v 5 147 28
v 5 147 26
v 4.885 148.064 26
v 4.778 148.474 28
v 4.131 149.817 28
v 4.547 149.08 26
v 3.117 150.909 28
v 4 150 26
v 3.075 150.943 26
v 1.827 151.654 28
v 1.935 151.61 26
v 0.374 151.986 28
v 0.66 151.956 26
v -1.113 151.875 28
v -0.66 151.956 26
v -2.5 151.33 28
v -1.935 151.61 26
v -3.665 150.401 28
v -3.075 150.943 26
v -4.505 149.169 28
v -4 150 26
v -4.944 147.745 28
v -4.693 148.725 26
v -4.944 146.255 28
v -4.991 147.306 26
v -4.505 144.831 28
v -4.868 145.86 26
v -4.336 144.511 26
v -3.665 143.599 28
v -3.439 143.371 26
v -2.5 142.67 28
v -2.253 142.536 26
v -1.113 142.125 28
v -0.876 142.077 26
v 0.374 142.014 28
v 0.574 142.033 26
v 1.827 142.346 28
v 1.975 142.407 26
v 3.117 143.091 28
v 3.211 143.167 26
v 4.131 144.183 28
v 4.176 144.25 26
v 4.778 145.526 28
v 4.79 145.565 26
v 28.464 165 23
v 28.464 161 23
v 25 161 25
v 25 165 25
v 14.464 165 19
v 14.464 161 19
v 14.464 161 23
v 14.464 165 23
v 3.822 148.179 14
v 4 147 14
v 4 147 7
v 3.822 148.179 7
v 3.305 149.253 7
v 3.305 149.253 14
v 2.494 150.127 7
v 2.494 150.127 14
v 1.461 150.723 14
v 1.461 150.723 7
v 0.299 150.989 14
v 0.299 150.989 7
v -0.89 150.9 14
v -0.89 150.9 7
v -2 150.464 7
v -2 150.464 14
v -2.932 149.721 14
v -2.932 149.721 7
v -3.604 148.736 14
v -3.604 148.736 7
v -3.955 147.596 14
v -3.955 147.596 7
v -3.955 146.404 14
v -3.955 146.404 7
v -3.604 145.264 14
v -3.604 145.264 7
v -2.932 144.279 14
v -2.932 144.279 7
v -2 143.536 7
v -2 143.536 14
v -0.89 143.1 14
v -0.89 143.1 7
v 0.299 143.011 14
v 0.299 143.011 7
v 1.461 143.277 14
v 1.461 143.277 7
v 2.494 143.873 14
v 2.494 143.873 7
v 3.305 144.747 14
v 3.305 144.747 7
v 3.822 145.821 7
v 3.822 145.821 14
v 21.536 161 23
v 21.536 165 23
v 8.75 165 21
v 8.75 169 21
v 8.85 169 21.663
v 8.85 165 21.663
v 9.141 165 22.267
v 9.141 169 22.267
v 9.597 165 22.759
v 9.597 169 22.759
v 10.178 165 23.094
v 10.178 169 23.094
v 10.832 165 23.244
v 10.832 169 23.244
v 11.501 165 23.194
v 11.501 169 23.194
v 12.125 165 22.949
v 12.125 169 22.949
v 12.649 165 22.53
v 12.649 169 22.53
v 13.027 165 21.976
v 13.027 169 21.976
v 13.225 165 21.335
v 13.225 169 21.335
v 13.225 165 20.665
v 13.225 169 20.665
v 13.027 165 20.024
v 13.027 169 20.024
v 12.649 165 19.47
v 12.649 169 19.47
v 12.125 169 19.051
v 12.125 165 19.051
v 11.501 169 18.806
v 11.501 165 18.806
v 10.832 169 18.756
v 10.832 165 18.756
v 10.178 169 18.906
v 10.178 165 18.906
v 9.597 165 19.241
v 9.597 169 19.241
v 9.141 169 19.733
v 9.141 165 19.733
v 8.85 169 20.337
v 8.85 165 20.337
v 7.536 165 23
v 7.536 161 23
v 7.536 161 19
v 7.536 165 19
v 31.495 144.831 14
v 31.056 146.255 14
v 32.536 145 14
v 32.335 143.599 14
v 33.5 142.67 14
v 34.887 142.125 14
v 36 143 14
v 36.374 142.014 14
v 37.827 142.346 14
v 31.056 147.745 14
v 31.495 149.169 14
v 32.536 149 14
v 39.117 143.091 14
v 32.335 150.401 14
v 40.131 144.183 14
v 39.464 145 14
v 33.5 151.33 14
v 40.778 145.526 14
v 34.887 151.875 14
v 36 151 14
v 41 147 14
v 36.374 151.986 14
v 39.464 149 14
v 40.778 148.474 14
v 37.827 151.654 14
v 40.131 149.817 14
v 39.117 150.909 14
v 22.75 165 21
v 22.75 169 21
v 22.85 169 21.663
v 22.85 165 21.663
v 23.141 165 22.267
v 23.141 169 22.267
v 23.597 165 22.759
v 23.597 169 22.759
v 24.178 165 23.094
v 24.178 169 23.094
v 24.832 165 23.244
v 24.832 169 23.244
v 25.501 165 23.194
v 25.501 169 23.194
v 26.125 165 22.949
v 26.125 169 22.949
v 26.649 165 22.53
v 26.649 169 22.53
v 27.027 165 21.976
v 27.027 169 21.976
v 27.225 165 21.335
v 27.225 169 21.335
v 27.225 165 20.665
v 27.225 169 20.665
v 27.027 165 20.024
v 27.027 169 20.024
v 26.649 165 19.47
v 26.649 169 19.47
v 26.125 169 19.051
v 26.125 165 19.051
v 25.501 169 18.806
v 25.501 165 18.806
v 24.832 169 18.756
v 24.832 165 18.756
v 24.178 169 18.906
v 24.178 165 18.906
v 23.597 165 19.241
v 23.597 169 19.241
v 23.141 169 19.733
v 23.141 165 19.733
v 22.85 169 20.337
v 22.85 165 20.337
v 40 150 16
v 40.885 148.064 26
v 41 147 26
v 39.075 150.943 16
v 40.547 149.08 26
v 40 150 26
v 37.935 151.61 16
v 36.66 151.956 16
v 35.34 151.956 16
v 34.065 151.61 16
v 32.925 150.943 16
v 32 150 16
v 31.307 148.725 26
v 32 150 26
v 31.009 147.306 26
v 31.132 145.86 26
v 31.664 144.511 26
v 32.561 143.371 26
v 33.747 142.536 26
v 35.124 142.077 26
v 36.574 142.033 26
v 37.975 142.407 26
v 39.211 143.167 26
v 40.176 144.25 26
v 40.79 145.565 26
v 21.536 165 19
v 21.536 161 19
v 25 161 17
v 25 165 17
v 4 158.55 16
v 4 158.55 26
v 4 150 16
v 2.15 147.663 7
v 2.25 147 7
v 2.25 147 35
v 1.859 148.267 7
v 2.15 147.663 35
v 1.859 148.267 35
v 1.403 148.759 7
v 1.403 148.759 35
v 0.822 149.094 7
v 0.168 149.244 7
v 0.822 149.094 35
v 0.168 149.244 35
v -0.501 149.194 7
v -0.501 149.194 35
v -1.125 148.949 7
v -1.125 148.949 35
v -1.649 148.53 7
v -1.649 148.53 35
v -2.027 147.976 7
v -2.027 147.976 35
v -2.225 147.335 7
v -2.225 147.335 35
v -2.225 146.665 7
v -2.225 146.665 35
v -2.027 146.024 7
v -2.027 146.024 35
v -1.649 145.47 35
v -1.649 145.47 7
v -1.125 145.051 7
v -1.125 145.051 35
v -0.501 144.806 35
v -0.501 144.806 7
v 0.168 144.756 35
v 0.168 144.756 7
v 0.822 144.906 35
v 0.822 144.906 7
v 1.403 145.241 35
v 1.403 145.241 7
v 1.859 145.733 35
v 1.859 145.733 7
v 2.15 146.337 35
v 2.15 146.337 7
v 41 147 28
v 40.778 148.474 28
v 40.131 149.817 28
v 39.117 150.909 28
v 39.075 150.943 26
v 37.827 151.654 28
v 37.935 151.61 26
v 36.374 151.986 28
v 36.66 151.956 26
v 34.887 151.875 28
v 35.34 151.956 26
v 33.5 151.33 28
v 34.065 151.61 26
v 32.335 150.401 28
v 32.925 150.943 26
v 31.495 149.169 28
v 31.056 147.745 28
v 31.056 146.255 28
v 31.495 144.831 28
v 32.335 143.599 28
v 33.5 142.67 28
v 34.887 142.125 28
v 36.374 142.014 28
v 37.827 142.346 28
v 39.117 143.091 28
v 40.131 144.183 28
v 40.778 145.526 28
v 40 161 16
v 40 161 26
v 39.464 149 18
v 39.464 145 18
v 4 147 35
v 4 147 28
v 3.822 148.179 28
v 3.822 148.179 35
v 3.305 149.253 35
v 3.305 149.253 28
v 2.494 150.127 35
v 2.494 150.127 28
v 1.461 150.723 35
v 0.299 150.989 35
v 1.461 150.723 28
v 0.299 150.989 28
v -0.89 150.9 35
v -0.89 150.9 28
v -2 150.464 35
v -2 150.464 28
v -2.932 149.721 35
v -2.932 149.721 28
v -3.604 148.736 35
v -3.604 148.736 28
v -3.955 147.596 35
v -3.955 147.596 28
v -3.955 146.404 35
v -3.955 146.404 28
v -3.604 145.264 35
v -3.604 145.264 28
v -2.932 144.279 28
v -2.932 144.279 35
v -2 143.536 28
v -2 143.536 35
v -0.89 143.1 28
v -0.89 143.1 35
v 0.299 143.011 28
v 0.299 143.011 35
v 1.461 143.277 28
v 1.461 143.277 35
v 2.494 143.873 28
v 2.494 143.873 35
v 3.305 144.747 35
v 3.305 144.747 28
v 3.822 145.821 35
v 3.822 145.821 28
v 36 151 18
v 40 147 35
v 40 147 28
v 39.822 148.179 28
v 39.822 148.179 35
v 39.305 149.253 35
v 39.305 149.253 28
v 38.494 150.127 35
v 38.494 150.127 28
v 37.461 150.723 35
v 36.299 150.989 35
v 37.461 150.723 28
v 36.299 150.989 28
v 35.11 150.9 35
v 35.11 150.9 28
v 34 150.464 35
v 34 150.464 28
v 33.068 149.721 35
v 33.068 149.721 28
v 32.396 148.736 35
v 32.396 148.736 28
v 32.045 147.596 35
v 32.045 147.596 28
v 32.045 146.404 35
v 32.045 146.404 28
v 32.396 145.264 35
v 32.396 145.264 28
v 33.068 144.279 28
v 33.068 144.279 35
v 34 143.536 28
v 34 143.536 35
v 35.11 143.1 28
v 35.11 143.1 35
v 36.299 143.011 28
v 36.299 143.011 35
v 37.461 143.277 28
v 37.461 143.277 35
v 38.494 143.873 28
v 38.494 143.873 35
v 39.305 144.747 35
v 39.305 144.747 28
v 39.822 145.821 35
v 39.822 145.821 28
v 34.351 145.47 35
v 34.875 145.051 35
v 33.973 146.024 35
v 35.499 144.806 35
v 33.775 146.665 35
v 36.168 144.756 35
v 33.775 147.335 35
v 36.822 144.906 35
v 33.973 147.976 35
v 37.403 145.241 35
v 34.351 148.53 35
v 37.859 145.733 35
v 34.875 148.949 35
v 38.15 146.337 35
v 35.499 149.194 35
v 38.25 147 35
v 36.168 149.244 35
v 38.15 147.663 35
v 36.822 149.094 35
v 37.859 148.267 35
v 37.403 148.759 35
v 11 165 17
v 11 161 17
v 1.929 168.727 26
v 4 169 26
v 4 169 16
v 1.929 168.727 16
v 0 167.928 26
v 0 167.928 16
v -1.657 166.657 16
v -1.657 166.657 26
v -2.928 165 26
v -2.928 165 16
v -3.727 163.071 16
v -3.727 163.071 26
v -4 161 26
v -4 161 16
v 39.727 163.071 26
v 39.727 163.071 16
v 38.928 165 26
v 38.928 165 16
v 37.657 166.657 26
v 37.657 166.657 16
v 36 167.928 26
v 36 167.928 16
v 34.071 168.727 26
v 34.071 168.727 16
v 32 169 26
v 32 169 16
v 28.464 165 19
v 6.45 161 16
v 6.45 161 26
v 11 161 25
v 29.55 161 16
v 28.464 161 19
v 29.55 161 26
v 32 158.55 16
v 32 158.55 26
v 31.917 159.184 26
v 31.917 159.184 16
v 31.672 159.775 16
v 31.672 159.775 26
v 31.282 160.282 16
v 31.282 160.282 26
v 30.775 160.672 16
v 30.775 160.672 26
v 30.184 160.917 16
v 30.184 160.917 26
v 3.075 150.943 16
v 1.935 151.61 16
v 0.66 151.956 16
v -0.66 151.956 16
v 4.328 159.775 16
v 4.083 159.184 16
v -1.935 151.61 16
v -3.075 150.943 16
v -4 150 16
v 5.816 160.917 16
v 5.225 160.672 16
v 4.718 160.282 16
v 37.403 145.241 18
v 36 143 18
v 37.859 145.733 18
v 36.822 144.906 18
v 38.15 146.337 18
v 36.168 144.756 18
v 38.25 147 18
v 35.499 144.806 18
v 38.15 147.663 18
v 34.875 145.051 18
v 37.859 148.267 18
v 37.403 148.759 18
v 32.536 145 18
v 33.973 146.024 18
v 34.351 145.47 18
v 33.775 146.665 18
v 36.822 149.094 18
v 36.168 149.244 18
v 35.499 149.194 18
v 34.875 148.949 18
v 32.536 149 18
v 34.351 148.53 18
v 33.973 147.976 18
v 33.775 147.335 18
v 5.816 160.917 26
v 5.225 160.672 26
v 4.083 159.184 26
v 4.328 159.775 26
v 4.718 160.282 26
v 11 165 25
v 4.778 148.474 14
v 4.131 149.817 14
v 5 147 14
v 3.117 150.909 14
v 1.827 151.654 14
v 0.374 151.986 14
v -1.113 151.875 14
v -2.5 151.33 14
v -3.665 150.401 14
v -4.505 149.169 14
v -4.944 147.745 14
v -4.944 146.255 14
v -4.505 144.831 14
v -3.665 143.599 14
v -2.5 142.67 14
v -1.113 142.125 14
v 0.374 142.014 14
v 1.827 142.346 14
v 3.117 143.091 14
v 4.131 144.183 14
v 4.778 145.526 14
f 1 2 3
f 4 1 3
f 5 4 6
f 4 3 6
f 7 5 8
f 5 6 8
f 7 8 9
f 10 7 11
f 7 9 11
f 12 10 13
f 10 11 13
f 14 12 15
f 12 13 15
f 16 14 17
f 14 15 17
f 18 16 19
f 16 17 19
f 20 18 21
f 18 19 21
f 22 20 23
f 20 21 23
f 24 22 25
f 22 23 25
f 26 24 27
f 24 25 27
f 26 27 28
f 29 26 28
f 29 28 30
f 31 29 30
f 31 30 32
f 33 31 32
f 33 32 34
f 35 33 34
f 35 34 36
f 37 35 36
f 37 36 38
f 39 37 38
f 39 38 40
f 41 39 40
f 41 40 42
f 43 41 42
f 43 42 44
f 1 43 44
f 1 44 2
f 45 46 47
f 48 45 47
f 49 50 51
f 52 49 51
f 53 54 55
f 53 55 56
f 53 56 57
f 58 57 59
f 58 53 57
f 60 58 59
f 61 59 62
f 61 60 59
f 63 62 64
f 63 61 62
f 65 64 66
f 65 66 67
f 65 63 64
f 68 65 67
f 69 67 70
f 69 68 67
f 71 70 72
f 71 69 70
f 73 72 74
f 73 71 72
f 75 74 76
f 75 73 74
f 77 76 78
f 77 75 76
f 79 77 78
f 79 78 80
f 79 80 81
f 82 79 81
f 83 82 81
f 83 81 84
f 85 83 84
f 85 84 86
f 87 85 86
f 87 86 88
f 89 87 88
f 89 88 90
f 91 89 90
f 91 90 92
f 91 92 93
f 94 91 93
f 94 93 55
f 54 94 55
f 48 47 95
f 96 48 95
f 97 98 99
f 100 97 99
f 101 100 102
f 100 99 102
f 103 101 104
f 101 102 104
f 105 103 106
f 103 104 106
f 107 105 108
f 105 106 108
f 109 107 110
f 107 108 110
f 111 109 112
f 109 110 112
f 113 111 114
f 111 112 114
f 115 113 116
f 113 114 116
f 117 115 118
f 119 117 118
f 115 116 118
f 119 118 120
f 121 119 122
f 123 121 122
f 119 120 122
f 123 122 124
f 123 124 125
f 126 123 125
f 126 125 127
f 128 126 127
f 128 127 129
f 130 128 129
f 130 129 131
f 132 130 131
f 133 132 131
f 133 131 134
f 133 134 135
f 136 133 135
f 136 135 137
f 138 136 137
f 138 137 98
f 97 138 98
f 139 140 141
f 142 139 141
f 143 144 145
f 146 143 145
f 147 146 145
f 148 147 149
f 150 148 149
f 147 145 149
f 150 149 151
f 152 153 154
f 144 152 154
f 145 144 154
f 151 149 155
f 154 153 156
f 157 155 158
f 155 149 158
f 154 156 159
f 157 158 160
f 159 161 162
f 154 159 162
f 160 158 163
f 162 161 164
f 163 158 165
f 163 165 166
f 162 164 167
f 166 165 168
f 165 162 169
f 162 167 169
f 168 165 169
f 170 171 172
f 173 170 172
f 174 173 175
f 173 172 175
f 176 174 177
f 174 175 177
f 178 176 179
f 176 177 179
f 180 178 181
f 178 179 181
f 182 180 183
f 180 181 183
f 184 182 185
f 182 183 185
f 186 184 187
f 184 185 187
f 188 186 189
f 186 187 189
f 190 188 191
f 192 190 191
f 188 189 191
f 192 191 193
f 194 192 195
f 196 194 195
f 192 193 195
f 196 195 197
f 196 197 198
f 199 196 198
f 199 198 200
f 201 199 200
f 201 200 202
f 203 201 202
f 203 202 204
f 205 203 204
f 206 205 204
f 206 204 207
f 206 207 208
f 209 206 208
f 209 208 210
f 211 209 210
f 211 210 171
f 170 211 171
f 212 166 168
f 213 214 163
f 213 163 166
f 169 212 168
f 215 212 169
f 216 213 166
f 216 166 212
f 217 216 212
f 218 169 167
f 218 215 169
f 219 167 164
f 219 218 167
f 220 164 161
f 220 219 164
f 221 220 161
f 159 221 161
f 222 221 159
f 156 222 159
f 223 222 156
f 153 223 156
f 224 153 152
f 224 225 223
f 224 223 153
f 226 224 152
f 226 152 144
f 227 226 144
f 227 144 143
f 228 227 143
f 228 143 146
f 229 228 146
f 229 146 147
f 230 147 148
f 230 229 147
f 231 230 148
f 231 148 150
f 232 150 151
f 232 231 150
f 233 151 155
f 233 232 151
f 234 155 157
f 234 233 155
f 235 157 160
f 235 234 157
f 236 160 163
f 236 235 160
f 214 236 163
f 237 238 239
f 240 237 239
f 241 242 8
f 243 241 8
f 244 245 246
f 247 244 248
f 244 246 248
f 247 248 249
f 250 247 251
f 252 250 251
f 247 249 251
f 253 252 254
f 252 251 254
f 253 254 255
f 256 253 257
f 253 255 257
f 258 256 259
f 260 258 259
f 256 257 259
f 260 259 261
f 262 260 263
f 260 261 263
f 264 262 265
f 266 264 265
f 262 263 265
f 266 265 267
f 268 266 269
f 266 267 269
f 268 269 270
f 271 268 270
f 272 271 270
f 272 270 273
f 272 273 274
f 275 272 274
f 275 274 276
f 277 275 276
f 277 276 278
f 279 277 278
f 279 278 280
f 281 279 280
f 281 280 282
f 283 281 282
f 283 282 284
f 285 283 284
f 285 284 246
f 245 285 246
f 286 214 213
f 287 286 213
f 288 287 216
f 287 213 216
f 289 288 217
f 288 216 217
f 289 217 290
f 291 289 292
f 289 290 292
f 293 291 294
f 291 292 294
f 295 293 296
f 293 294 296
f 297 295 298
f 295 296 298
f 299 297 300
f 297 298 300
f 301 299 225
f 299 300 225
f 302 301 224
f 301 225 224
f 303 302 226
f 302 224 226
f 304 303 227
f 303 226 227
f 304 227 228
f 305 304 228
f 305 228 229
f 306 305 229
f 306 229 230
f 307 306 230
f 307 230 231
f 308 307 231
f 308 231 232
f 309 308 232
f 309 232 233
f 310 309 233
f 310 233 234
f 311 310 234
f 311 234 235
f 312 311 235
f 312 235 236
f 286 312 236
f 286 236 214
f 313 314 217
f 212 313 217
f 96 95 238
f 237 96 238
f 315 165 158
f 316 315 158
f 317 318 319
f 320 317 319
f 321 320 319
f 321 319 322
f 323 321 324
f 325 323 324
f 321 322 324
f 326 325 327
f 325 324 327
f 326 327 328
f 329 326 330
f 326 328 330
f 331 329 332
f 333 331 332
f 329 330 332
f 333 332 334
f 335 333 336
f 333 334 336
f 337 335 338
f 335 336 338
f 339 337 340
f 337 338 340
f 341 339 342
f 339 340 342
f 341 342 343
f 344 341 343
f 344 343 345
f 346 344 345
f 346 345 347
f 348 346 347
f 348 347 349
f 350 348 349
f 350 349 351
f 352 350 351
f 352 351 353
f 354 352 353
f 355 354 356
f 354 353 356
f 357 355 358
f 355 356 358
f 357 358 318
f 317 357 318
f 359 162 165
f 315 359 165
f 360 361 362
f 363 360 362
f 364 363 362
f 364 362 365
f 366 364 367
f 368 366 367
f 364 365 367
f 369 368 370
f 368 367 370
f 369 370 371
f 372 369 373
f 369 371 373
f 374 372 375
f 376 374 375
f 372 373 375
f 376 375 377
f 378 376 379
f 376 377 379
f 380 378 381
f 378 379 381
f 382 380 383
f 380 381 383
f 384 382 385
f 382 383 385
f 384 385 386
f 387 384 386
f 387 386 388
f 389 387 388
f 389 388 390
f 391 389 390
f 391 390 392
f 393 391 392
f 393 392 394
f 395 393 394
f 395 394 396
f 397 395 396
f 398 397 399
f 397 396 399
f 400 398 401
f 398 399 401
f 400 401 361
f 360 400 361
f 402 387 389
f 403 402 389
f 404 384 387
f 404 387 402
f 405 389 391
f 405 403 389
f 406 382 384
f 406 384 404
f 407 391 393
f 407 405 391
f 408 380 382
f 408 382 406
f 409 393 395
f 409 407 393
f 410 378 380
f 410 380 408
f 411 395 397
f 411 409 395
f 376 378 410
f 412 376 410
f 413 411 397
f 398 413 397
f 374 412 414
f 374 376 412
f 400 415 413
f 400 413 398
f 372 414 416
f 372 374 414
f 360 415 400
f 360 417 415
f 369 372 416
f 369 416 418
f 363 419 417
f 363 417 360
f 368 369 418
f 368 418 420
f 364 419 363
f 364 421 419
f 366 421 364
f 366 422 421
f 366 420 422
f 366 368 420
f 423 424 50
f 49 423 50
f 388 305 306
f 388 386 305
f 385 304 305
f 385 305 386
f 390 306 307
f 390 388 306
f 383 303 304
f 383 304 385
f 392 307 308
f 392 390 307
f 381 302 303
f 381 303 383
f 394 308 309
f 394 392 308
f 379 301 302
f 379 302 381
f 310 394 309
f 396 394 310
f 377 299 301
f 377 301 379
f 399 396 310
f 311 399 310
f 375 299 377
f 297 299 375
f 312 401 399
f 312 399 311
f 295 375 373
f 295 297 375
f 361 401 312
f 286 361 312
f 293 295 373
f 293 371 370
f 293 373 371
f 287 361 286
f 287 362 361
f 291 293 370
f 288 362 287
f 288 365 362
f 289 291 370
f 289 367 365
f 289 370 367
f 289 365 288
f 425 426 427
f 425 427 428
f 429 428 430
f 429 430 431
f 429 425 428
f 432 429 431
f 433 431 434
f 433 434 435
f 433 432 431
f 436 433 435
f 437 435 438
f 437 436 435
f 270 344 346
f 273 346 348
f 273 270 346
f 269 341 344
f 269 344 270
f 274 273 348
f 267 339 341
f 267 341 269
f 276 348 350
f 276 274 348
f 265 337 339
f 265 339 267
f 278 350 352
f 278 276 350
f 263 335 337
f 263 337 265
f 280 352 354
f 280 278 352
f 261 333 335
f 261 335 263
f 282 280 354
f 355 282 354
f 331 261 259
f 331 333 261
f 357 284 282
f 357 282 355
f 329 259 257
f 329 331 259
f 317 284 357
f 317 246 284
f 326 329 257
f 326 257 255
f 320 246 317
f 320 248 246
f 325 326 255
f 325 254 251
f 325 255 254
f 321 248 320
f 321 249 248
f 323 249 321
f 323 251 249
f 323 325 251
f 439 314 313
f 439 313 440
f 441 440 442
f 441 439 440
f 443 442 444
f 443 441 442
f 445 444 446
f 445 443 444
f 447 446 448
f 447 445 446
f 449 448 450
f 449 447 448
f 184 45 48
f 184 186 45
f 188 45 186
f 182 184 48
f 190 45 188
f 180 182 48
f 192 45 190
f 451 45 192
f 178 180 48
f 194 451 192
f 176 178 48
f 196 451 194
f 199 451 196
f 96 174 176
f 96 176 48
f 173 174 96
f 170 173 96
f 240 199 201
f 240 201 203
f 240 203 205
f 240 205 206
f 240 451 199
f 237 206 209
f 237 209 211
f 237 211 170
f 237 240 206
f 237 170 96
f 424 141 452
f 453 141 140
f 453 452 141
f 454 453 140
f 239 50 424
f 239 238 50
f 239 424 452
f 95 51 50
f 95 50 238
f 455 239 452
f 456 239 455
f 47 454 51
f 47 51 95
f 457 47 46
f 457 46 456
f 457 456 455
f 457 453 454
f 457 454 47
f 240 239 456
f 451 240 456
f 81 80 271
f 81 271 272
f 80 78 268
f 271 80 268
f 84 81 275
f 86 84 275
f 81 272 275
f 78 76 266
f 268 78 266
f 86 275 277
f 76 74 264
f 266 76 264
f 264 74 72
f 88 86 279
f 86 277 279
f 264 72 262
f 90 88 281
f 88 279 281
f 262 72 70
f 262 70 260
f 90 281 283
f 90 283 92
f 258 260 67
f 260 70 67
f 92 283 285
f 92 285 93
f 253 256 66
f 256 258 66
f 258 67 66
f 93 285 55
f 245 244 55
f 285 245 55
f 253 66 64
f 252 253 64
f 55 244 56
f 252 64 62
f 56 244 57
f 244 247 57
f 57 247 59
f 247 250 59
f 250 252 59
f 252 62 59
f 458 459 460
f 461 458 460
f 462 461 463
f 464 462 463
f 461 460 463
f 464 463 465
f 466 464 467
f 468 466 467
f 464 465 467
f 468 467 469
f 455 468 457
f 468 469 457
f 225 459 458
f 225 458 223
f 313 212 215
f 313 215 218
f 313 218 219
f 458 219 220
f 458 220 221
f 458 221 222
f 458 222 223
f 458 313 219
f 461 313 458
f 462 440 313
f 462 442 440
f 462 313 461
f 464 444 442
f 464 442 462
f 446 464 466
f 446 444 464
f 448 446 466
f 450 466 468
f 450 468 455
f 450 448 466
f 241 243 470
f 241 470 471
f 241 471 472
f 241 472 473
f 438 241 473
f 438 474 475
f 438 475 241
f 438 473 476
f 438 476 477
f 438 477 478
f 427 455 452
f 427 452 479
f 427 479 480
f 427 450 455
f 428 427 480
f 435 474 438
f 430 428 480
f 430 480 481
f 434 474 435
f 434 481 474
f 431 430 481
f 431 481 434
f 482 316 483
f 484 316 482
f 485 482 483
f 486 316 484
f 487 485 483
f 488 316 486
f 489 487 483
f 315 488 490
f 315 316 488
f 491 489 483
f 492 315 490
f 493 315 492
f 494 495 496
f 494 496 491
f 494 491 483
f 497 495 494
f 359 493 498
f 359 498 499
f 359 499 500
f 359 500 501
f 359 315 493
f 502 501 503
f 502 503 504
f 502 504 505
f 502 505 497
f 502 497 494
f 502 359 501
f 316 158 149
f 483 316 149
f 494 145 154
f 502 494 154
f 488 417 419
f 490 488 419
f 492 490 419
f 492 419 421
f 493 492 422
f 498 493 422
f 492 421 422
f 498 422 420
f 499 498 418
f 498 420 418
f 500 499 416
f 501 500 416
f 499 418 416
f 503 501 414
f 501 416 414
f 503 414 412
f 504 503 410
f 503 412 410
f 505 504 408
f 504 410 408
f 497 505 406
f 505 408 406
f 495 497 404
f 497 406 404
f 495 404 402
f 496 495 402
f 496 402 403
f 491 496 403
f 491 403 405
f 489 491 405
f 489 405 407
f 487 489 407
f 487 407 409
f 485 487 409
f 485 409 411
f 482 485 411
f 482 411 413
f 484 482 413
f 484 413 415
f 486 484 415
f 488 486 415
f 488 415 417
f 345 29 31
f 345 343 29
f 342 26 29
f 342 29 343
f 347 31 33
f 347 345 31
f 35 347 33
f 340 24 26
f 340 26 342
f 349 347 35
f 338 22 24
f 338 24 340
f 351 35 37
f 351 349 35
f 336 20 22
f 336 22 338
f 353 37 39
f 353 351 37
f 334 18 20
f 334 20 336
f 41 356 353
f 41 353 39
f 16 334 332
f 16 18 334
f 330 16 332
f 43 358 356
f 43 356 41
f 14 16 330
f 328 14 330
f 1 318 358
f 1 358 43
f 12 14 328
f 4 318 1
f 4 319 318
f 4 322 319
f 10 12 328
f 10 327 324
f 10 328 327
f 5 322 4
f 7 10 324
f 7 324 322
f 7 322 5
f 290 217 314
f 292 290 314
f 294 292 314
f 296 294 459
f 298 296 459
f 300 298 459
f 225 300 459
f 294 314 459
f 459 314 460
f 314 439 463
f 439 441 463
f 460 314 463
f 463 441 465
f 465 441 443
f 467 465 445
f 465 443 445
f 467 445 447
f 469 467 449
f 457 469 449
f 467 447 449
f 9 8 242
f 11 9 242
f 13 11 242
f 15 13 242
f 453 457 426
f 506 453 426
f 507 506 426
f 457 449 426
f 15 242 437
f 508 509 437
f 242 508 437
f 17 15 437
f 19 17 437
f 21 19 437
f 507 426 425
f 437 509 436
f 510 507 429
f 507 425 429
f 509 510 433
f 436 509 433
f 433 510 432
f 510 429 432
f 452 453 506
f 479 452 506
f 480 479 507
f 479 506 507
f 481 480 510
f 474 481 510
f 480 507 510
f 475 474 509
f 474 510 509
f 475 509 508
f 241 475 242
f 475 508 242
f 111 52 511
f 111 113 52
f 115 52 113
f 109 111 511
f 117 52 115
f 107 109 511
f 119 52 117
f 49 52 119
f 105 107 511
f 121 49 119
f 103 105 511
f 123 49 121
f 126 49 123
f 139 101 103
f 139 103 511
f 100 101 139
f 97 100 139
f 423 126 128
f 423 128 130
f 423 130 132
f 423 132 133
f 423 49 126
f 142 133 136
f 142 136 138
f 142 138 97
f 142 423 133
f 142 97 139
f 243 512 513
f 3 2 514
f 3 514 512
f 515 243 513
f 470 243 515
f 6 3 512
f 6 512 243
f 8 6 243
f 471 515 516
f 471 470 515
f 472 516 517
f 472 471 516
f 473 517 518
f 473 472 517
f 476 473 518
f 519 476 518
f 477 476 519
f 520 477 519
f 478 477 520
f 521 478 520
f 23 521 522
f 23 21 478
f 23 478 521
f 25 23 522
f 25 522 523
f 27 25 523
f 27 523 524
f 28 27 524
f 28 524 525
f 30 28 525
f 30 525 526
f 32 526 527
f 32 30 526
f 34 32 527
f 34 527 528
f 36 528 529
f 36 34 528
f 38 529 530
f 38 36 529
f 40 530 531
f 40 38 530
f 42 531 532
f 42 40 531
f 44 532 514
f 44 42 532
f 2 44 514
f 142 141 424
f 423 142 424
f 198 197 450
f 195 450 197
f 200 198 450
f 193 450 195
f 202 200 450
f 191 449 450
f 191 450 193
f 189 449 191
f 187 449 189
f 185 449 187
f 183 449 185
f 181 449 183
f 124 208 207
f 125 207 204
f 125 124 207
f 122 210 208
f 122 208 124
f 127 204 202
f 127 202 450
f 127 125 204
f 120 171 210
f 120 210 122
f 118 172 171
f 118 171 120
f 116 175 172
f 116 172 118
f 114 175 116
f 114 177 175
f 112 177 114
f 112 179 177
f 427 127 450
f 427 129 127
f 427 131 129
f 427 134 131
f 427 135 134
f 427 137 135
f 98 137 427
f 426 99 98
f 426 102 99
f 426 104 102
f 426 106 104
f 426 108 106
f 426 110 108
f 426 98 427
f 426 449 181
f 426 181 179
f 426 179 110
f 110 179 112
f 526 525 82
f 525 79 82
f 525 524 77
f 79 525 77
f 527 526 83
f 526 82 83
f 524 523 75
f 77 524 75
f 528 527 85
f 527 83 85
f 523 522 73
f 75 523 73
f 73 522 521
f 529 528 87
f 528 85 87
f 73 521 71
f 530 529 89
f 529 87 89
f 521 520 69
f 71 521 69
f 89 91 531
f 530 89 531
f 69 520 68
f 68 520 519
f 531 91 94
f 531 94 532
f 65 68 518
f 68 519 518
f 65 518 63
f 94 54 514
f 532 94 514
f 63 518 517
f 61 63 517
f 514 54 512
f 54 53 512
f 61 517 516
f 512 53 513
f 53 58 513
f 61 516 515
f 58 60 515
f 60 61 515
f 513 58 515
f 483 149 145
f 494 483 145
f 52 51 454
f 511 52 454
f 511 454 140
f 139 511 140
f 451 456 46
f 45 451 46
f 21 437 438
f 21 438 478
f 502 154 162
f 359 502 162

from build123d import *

# Parameters (mm, degrees)
SKETCH024_W             = 24
SKETCH024_H             = 10
SKETCH024_R             = 2.25
PAD008_DEPTH            = 8
PAD009_DEPTH            = 10
POCKET_DEPTH            = 4
SKETCH027_R             = 5
PAD010_DEPTH            = 2
PAD010_DEPTH_BACK       = 12
SKETCH028_R             = 4
PAD011_DEPTH            = 7
PAD011_DEPTH_BACK       = 21
SKETCH029_R             = 4
PAD012_DEPTH            = 7
POCKET001_DEPTH         = 4
SKETCH031_R             = 2.25
HOLE001_DEPTH           = 50
BODY003_PLACEMENT_ANGLE = 180


with BuildPart() as part:
    # Sketch024 → Pad008 (new body)
    with BuildSketch(Plane.XZ):
        with Locations((0, 44)):
            Rectangle(SKETCH024_W, SKETCH024_H)
        with Locations((-7, 44)):
            Circle(SKETCH024_R, mode=Mode.SUBTRACT)
        with Locations((7, 44)):
            Circle(SKETCH024_R, mode=Mode.SUBTRACT)
    extrude(amount=-PAD008_DEPTH)

    # Sketch025 (on Face1 of Pad008) → Pad009 (join)
    with BuildSketch(Plane(origin=(0, 0, 49), x_dir=(-1, 0, 0), z_dir=(0, 0, 1))):
        with BuildLine():
            Line((-10, 0), (-10, -8))
            Line((-11.55, -8), (-10, -8))
            ThreePointArc((-11.55, -8), (-13.28241, -8.717587), (-14, -10.449996))
            Line((-14, -10.449996), (-14.000017, -22))
            Line((-22.000017, -22), (-14.000017, -22))
            Line((-22, -8), (-22.000017, -22))
            ThreePointArc((-14, 0), (-19.656854, -2.343146), (-22, -8))
            Line((-10, 0), (-14, 0))
        make_face()
        with BuildLine():
            Line((10, -8), (10, 0))
            Line((10, 0), (14, 0))
            ThreePointArc((22, -8), (19.656854, -2.343146), (14, 0))
            Line((22, -8), (22, -22))
            Line((14, -22), (22, -22))
            Line((14, -10.45), (14, -22))
            ThreePointArc((14, -10.45), (13.282412, -8.717588), (11.55, -8))
            Line((10, -8), (11.55, -8))
        make_face()
    extrude(amount=-PAD009_DEPTH)

    # Sketch026 (on Face10 of Pad009) → Pocket (cut)
    with BuildSketch(Plane(origin=(0, 8, 0), x_dir=(1, 0, 0), z_dir=(0, 1, 0))):
        Polygon((-3.535898, -46), (-3.535898, -42), (-7, -40), (-10.464102, -42), (-10.464102, -46), (-7, -48), align=None)
        Polygon((10.464102, -46), (10.464102, -42), (7, -40), (3.535898, -42), (3.535898, -46), (7, -48), align=None)
    extrude(amount=-POCKET_DEPTH, mode=Mode.SUBTRACT)

    # Sketch027 (on Face3 of Pocket) → Pad010 (join, two sides)
    with BuildSketch(Plane(origin=(0, 0, 49), x_dir=(-1, 0, 0), z_dir=(0, 0, 1))) as pad010_sk:
        with Locations((-18, -22)):
            Circle(SKETCH027_R)
        with Locations((18, -22)):
            Circle(SKETCH027_R)
    extrude(amount=PAD010_DEPTH)
    extrude(pad010_sk.sketch, amount=-PAD010_DEPTH_BACK)

    # Sketch028 (on Face36 of Pad010) → Pad011 (join, two sides)
    with BuildSketch(Plane(origin=(0, 0, 51), x_dir=(-1, 0, 0), z_dir=(0, 0, 1))) as pad011_sk:
        with Locations((-18, -22)):
            Circle(SKETCH028_R)
    extrude(amount=PAD011_DEPTH)
    extrude(pad011_sk.sketch, amount=-PAD011_DEPTH_BACK)

    # Sketch029 (on Face50 of Pad011) → Pad012 (join)
    with BuildSketch(Plane(origin=(0, 0, 51), x_dir=(-1, 0, 0), z_dir=(0, 0, 1))):
        with Locations((18, -22)):
            Circle(SKETCH029_R)
    extrude(amount=PAD012_DEPTH)

    # Sketch030 (on Face49 of Pad012) → Pocket001 (cut)
    with BuildSketch(Plane(origin=(0, 0, 37), x_dir=(1, 0, 0), z_dir=(0, 0, -1))):
        Polygon((-14.535898, -24), (-14.535898, -20), (-18, -18), (-21.464102, -20), (-21.464102, -24), (-18, -26), align=None)
    extrude(amount=-POCKET001_DEPTH, mode=Mode.SUBTRACT)

    # Sketch031 (on Face61 of Pocket001) → Hole001 (cut)
    with BuildSketch(Plane(origin=(0, 0, 58), x_dir=(-1, 0, 0), z_dir=(0, 0, 1))):
        with Locations((18, -22)):
            Circle(SKETCH031_R)
        with Locations((-18, -22)):
            Circle(SKETCH031_R)
    extrude(amount=-HOLE001_DEPTH, mode=Mode.SUBTRACT)


with BuildPart() as part_1:
    # Body003 placement: moved
    add(part.part.moved(Location((18, 169, -23))).rotate(Axis((18, 169, -23), (0, 0, 1)), BODY003_PLACEMENT_ANGLE))


solid = part_1.part
